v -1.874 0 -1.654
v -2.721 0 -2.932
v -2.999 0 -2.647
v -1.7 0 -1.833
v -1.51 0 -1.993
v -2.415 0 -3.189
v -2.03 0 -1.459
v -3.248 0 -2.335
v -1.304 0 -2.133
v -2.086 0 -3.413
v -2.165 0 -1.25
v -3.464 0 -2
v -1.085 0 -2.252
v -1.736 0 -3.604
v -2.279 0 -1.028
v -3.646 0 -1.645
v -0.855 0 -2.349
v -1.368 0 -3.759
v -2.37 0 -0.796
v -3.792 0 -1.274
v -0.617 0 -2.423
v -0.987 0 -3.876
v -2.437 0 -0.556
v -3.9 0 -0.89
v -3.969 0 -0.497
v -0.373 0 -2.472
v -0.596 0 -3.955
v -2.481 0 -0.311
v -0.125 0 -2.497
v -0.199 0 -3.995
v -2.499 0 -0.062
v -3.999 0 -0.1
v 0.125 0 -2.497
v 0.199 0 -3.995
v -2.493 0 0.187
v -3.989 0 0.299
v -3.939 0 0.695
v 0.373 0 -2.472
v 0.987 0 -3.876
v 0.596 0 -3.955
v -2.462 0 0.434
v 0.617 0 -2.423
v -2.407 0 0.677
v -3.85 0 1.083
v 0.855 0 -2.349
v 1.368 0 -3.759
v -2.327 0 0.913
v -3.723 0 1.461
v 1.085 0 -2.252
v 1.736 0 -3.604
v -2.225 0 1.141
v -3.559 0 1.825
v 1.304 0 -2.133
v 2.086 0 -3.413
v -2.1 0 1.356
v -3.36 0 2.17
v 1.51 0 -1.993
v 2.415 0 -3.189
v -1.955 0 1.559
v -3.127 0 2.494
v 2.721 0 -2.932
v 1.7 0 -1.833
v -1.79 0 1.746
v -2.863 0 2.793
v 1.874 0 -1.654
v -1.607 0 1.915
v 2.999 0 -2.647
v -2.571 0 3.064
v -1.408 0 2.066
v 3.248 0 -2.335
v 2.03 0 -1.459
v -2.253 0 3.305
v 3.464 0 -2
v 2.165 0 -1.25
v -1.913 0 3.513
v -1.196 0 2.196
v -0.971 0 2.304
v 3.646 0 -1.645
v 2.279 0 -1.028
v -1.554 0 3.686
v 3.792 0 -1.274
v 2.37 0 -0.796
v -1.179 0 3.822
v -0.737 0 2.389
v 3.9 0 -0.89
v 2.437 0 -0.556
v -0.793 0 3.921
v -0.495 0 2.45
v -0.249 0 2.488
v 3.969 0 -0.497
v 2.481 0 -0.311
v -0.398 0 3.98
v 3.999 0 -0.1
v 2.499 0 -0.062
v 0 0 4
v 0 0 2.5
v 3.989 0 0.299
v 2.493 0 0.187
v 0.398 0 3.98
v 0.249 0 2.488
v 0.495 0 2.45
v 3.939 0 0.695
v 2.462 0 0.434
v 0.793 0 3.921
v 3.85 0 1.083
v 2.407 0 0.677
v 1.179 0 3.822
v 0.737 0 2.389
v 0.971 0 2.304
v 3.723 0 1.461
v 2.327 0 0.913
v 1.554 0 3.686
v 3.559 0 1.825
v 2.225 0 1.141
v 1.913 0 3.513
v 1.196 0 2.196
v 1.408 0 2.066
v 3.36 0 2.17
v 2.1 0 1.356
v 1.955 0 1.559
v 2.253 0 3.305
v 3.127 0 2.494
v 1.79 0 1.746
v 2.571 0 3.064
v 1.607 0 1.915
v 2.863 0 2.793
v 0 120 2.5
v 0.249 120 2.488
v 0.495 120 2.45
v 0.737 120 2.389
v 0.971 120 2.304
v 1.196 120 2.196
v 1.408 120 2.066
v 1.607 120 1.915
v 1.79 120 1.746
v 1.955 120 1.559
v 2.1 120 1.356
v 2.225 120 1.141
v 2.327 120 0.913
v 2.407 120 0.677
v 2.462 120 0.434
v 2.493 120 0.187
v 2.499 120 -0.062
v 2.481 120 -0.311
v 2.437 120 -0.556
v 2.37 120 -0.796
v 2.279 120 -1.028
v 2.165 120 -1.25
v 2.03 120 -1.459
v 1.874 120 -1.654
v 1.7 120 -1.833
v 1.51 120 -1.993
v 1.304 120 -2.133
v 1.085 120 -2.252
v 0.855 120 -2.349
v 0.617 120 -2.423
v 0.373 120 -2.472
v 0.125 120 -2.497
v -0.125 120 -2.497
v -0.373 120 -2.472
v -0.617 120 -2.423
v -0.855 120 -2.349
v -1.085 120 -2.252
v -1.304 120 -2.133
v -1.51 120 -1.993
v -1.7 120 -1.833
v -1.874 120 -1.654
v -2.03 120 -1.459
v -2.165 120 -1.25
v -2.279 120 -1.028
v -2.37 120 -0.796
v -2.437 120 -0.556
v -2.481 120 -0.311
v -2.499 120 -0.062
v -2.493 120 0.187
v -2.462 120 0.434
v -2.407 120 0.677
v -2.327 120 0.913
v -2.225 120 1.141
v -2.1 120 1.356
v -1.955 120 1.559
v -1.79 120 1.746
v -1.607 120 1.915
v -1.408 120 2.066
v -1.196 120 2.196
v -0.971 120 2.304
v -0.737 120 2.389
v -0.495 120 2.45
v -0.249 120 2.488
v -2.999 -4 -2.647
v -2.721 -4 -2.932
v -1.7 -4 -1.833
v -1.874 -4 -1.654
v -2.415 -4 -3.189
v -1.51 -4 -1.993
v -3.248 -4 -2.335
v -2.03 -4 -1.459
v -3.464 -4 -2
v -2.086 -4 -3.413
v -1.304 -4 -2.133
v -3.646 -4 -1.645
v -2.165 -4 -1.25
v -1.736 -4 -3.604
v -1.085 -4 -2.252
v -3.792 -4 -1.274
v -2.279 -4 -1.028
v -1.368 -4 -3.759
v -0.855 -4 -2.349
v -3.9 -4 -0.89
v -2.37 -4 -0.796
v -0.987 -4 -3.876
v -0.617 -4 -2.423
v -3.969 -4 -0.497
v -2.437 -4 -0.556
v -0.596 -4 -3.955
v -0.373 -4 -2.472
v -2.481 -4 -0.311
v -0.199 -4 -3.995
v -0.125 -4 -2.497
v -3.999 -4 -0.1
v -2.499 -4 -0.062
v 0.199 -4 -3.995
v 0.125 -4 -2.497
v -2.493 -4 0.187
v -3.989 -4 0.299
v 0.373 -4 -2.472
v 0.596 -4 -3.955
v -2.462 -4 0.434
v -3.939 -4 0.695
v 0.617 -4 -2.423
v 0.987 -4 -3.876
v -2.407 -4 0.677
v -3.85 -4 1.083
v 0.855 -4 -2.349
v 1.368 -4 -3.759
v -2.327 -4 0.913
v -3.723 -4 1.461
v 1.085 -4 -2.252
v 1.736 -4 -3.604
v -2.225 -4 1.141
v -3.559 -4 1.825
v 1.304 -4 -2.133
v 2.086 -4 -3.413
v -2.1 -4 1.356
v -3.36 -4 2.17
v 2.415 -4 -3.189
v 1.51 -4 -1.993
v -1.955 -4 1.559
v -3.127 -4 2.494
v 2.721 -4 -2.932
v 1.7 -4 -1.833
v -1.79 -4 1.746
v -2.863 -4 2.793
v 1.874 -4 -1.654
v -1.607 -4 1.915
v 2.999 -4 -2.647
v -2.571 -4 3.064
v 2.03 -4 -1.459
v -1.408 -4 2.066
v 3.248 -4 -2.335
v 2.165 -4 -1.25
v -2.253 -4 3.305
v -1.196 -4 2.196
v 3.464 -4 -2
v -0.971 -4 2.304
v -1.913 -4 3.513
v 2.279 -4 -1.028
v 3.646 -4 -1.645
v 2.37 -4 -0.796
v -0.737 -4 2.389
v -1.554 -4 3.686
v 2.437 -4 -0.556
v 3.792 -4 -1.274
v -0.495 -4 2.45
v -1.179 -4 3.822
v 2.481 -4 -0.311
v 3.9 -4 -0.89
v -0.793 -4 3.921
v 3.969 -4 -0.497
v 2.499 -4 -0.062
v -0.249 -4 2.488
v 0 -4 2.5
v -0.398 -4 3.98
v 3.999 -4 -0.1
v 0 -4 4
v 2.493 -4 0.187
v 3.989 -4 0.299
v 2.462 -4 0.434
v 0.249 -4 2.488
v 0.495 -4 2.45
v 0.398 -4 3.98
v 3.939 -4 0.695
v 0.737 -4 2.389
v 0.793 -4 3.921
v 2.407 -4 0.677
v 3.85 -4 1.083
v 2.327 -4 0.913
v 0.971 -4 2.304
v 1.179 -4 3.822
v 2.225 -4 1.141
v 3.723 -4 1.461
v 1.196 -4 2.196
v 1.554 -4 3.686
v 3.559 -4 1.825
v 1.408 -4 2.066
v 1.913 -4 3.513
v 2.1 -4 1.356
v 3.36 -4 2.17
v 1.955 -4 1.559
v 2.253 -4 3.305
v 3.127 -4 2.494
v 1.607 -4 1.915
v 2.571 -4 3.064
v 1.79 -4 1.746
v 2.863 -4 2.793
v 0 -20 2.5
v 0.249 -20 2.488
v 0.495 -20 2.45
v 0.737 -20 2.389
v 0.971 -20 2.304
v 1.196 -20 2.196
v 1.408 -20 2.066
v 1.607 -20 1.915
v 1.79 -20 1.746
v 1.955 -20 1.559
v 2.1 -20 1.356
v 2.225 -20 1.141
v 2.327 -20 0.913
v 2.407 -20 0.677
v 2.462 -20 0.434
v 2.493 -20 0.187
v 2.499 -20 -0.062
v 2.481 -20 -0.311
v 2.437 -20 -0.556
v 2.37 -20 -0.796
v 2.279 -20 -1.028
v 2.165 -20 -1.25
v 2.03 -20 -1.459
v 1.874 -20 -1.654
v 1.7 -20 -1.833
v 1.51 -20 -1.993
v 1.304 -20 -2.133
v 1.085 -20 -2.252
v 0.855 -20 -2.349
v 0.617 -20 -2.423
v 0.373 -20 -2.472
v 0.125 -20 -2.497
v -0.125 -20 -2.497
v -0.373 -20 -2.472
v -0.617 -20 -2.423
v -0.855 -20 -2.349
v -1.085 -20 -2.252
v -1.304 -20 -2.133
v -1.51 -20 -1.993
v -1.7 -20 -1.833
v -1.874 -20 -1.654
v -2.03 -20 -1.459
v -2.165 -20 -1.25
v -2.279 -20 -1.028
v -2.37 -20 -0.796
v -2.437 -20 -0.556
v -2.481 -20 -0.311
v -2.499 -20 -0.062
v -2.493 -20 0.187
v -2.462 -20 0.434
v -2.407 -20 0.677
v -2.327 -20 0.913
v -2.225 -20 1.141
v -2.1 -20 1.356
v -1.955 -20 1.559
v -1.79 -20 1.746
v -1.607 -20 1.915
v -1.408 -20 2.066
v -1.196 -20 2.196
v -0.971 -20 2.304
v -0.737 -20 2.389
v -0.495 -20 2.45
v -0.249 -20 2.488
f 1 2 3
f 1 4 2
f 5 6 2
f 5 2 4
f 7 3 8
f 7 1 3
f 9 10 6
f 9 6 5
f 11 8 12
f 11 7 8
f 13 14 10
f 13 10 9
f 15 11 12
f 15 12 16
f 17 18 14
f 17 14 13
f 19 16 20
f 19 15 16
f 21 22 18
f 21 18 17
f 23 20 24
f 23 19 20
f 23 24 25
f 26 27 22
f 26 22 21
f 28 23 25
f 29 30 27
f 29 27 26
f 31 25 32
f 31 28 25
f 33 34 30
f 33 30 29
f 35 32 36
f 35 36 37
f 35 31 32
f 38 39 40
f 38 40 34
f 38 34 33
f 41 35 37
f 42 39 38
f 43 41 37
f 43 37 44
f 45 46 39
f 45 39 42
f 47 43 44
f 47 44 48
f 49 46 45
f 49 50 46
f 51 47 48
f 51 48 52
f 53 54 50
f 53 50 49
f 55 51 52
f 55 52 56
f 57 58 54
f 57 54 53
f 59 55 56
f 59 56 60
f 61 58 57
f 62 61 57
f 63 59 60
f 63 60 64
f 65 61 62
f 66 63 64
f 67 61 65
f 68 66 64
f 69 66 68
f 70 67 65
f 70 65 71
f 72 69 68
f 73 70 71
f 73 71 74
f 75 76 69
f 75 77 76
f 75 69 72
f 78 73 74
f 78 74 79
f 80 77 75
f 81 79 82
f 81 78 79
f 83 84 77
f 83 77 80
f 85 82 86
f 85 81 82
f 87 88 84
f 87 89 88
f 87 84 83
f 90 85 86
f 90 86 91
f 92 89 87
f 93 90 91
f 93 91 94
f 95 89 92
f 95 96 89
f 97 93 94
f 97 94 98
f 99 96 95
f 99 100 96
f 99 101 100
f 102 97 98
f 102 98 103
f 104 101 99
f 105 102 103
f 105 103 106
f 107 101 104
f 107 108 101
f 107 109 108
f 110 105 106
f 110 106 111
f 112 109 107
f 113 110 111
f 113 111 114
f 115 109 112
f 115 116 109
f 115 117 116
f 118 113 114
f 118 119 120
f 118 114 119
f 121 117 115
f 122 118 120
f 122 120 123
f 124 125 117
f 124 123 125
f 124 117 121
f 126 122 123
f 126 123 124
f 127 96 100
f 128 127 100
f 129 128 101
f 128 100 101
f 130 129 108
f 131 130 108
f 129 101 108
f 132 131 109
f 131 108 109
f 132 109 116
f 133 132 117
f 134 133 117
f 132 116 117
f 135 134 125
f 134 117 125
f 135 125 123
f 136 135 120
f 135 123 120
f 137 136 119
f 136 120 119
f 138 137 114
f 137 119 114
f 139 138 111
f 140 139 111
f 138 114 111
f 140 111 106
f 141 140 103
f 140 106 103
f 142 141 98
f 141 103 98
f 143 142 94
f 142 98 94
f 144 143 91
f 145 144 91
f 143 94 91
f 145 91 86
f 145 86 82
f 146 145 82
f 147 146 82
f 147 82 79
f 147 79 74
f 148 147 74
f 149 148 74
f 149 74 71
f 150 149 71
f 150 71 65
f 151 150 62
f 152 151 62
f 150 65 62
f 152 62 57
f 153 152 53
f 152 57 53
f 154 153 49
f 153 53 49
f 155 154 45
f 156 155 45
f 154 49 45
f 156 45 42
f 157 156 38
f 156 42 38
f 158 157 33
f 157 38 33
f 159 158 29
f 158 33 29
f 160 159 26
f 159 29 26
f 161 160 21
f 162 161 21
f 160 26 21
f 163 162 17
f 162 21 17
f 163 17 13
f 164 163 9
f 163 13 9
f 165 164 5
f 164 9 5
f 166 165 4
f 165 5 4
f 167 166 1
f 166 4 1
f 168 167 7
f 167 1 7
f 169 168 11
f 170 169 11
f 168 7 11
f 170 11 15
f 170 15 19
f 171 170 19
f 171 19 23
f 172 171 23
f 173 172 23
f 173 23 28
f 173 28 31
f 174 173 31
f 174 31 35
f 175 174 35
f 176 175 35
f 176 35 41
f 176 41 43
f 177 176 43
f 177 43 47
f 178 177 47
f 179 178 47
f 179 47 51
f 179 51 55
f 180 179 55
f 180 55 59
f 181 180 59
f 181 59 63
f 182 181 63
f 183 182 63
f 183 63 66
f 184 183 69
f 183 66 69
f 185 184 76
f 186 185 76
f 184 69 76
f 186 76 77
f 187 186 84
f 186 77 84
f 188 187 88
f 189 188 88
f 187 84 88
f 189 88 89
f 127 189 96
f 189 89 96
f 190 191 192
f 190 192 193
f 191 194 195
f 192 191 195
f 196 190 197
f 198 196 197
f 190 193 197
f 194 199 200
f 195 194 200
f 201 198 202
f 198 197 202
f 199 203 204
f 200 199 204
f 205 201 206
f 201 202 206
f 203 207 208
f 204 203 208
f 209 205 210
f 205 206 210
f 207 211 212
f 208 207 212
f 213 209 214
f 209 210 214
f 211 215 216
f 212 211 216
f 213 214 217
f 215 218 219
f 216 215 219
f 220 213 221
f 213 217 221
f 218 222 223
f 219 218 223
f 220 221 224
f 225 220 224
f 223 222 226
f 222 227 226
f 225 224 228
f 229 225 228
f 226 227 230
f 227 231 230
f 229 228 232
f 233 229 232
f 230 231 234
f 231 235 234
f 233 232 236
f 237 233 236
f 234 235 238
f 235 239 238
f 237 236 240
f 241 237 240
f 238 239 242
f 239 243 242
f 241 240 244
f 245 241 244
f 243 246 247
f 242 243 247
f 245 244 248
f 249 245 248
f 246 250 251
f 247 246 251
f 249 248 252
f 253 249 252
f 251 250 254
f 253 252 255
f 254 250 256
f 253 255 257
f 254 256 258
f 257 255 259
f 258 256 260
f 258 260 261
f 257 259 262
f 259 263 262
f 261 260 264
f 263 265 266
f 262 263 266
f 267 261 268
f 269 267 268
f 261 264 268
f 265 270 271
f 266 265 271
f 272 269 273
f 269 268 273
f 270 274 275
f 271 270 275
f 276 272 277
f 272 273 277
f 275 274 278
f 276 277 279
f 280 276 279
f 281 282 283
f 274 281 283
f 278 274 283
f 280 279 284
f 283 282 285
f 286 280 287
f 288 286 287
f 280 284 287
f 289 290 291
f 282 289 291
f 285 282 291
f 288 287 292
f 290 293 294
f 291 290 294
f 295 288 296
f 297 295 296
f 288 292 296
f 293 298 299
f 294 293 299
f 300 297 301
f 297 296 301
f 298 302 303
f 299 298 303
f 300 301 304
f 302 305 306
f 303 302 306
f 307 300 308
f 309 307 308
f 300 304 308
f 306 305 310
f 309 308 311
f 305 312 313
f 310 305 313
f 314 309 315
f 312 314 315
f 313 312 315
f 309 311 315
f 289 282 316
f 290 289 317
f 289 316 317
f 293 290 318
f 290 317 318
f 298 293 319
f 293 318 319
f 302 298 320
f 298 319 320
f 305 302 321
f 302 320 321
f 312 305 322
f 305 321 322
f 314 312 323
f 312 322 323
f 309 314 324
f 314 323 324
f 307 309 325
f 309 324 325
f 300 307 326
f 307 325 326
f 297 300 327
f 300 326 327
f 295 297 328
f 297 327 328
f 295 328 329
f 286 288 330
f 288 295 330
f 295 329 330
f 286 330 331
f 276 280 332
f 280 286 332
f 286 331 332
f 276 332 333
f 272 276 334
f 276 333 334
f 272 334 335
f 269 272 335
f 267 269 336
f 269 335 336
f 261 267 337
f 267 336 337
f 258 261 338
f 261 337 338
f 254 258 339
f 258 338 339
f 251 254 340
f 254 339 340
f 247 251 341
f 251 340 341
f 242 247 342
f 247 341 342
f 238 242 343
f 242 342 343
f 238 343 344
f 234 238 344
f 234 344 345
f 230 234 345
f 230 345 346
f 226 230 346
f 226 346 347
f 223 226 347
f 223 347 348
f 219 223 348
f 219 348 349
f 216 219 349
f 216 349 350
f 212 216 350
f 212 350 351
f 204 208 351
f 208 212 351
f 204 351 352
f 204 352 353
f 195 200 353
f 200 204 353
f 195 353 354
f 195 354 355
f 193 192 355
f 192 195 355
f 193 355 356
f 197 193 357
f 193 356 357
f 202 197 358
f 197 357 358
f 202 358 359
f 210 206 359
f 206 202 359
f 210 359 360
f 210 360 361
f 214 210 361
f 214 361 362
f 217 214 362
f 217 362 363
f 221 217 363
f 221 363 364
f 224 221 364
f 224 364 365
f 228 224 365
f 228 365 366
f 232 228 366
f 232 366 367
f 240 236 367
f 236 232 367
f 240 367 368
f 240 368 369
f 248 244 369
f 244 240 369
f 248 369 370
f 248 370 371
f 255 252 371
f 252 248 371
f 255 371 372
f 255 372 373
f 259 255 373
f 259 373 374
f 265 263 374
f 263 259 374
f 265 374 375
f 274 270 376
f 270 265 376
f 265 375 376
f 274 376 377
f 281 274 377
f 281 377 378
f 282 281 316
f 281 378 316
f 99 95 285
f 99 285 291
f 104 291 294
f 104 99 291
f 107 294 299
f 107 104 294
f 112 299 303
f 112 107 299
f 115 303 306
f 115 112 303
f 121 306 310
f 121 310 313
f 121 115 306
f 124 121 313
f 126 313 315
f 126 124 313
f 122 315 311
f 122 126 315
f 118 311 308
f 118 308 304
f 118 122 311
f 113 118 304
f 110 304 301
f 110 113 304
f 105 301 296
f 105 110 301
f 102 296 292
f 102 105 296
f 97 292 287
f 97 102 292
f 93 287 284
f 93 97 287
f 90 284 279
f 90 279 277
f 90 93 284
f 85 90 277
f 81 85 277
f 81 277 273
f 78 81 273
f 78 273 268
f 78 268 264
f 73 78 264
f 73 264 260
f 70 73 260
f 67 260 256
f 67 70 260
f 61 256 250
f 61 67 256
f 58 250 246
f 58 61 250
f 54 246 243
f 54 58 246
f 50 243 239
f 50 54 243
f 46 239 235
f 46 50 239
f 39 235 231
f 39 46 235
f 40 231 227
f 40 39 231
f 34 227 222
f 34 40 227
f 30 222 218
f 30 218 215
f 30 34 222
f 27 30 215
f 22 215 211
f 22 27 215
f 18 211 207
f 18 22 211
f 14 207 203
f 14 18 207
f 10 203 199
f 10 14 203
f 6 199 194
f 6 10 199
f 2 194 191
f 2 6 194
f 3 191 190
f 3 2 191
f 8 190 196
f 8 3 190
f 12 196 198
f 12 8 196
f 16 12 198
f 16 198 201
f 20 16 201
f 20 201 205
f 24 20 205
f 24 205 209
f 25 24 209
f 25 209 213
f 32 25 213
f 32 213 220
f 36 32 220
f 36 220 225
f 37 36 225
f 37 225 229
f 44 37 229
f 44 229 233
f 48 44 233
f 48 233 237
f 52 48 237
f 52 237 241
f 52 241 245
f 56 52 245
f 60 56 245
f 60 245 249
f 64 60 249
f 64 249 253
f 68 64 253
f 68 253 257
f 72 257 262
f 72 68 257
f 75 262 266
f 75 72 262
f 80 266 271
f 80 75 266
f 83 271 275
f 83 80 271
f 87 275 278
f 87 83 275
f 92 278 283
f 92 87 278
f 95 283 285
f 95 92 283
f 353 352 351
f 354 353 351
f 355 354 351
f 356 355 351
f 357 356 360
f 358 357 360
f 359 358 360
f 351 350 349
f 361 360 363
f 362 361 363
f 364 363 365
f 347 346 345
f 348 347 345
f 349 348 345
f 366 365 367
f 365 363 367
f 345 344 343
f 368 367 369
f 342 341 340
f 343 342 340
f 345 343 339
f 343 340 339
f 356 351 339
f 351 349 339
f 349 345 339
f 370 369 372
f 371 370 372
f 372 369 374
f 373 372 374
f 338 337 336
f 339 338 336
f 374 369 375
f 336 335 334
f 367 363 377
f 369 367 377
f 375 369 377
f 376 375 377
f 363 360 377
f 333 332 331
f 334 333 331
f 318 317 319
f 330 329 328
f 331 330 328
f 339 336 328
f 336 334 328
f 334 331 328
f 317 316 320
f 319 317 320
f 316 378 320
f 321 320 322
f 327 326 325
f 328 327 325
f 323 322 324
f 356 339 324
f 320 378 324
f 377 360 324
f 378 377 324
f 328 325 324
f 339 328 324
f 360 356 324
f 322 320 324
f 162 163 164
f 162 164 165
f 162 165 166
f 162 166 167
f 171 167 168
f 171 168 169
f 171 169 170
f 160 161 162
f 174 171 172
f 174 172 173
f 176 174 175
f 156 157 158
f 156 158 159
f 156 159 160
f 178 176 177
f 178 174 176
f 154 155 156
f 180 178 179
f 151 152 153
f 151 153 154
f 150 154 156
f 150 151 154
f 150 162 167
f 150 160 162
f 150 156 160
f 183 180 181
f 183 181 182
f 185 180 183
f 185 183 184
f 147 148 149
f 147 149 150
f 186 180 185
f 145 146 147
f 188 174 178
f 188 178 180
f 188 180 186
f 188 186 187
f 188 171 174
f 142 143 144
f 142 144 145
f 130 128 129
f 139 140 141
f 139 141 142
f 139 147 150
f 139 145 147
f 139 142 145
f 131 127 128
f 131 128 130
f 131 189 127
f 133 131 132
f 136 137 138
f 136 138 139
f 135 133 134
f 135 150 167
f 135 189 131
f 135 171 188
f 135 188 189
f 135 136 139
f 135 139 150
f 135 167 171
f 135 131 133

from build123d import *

# Parameters (mm, degrees)
SKETCH1_R           = 2.5
BOSS_EXTRUDE1_DEPTH = 120
SKETCH2_R           = 4
BOSS_EXTRUDE2_DEPTH = 4
BOSS_EXTRUDE3_START = -20
SKETCH3_R           = 2.5
BOSS_EXTRUDE3_DEPTH = 20


with BuildPart() as part:
    # Sketch1 → Boss-Extrude1 (new body)
    with BuildSketch(Plane(origin=(0, 0, 0), x_dir=(1, 0, 0), z_dir=(0, 1, 0))):
        with Locations(Location((0, 0, 0), (0, 0, 270))):
            Circle(SKETCH1_R)
    extrude(amount=BOSS_EXTRUDE1_DEPTH)

    # Sketch2 → Boss-Extrude2 (add)
    with BuildSketch(Plane(origin=(0, 0, 0), x_dir=(1, 0, 0), z_dir=(0, 1, 0))):
        with Locations(Location((0, 0, 0), (0, 0, 270))):
            Circle(SKETCH2_R)
    extrude(amount=-BOSS_EXTRUDE2_DEPTH)

    # Sketch3 → Boss-Extrude3 (add)
    with BuildSketch(Plane(origin=(0, 0, 0), x_dir=(1, 0, 0), z_dir=(0, 1, 0)).offset(BOSS_EXTRUDE3_START)):
        with Locations(Location((0, 0, 0), (0, 0, 270))):
            Circle(SKETCH3_R)
    extrude(amount=BOSS_EXTRUDE3_DEPTH)


solid = part.part
